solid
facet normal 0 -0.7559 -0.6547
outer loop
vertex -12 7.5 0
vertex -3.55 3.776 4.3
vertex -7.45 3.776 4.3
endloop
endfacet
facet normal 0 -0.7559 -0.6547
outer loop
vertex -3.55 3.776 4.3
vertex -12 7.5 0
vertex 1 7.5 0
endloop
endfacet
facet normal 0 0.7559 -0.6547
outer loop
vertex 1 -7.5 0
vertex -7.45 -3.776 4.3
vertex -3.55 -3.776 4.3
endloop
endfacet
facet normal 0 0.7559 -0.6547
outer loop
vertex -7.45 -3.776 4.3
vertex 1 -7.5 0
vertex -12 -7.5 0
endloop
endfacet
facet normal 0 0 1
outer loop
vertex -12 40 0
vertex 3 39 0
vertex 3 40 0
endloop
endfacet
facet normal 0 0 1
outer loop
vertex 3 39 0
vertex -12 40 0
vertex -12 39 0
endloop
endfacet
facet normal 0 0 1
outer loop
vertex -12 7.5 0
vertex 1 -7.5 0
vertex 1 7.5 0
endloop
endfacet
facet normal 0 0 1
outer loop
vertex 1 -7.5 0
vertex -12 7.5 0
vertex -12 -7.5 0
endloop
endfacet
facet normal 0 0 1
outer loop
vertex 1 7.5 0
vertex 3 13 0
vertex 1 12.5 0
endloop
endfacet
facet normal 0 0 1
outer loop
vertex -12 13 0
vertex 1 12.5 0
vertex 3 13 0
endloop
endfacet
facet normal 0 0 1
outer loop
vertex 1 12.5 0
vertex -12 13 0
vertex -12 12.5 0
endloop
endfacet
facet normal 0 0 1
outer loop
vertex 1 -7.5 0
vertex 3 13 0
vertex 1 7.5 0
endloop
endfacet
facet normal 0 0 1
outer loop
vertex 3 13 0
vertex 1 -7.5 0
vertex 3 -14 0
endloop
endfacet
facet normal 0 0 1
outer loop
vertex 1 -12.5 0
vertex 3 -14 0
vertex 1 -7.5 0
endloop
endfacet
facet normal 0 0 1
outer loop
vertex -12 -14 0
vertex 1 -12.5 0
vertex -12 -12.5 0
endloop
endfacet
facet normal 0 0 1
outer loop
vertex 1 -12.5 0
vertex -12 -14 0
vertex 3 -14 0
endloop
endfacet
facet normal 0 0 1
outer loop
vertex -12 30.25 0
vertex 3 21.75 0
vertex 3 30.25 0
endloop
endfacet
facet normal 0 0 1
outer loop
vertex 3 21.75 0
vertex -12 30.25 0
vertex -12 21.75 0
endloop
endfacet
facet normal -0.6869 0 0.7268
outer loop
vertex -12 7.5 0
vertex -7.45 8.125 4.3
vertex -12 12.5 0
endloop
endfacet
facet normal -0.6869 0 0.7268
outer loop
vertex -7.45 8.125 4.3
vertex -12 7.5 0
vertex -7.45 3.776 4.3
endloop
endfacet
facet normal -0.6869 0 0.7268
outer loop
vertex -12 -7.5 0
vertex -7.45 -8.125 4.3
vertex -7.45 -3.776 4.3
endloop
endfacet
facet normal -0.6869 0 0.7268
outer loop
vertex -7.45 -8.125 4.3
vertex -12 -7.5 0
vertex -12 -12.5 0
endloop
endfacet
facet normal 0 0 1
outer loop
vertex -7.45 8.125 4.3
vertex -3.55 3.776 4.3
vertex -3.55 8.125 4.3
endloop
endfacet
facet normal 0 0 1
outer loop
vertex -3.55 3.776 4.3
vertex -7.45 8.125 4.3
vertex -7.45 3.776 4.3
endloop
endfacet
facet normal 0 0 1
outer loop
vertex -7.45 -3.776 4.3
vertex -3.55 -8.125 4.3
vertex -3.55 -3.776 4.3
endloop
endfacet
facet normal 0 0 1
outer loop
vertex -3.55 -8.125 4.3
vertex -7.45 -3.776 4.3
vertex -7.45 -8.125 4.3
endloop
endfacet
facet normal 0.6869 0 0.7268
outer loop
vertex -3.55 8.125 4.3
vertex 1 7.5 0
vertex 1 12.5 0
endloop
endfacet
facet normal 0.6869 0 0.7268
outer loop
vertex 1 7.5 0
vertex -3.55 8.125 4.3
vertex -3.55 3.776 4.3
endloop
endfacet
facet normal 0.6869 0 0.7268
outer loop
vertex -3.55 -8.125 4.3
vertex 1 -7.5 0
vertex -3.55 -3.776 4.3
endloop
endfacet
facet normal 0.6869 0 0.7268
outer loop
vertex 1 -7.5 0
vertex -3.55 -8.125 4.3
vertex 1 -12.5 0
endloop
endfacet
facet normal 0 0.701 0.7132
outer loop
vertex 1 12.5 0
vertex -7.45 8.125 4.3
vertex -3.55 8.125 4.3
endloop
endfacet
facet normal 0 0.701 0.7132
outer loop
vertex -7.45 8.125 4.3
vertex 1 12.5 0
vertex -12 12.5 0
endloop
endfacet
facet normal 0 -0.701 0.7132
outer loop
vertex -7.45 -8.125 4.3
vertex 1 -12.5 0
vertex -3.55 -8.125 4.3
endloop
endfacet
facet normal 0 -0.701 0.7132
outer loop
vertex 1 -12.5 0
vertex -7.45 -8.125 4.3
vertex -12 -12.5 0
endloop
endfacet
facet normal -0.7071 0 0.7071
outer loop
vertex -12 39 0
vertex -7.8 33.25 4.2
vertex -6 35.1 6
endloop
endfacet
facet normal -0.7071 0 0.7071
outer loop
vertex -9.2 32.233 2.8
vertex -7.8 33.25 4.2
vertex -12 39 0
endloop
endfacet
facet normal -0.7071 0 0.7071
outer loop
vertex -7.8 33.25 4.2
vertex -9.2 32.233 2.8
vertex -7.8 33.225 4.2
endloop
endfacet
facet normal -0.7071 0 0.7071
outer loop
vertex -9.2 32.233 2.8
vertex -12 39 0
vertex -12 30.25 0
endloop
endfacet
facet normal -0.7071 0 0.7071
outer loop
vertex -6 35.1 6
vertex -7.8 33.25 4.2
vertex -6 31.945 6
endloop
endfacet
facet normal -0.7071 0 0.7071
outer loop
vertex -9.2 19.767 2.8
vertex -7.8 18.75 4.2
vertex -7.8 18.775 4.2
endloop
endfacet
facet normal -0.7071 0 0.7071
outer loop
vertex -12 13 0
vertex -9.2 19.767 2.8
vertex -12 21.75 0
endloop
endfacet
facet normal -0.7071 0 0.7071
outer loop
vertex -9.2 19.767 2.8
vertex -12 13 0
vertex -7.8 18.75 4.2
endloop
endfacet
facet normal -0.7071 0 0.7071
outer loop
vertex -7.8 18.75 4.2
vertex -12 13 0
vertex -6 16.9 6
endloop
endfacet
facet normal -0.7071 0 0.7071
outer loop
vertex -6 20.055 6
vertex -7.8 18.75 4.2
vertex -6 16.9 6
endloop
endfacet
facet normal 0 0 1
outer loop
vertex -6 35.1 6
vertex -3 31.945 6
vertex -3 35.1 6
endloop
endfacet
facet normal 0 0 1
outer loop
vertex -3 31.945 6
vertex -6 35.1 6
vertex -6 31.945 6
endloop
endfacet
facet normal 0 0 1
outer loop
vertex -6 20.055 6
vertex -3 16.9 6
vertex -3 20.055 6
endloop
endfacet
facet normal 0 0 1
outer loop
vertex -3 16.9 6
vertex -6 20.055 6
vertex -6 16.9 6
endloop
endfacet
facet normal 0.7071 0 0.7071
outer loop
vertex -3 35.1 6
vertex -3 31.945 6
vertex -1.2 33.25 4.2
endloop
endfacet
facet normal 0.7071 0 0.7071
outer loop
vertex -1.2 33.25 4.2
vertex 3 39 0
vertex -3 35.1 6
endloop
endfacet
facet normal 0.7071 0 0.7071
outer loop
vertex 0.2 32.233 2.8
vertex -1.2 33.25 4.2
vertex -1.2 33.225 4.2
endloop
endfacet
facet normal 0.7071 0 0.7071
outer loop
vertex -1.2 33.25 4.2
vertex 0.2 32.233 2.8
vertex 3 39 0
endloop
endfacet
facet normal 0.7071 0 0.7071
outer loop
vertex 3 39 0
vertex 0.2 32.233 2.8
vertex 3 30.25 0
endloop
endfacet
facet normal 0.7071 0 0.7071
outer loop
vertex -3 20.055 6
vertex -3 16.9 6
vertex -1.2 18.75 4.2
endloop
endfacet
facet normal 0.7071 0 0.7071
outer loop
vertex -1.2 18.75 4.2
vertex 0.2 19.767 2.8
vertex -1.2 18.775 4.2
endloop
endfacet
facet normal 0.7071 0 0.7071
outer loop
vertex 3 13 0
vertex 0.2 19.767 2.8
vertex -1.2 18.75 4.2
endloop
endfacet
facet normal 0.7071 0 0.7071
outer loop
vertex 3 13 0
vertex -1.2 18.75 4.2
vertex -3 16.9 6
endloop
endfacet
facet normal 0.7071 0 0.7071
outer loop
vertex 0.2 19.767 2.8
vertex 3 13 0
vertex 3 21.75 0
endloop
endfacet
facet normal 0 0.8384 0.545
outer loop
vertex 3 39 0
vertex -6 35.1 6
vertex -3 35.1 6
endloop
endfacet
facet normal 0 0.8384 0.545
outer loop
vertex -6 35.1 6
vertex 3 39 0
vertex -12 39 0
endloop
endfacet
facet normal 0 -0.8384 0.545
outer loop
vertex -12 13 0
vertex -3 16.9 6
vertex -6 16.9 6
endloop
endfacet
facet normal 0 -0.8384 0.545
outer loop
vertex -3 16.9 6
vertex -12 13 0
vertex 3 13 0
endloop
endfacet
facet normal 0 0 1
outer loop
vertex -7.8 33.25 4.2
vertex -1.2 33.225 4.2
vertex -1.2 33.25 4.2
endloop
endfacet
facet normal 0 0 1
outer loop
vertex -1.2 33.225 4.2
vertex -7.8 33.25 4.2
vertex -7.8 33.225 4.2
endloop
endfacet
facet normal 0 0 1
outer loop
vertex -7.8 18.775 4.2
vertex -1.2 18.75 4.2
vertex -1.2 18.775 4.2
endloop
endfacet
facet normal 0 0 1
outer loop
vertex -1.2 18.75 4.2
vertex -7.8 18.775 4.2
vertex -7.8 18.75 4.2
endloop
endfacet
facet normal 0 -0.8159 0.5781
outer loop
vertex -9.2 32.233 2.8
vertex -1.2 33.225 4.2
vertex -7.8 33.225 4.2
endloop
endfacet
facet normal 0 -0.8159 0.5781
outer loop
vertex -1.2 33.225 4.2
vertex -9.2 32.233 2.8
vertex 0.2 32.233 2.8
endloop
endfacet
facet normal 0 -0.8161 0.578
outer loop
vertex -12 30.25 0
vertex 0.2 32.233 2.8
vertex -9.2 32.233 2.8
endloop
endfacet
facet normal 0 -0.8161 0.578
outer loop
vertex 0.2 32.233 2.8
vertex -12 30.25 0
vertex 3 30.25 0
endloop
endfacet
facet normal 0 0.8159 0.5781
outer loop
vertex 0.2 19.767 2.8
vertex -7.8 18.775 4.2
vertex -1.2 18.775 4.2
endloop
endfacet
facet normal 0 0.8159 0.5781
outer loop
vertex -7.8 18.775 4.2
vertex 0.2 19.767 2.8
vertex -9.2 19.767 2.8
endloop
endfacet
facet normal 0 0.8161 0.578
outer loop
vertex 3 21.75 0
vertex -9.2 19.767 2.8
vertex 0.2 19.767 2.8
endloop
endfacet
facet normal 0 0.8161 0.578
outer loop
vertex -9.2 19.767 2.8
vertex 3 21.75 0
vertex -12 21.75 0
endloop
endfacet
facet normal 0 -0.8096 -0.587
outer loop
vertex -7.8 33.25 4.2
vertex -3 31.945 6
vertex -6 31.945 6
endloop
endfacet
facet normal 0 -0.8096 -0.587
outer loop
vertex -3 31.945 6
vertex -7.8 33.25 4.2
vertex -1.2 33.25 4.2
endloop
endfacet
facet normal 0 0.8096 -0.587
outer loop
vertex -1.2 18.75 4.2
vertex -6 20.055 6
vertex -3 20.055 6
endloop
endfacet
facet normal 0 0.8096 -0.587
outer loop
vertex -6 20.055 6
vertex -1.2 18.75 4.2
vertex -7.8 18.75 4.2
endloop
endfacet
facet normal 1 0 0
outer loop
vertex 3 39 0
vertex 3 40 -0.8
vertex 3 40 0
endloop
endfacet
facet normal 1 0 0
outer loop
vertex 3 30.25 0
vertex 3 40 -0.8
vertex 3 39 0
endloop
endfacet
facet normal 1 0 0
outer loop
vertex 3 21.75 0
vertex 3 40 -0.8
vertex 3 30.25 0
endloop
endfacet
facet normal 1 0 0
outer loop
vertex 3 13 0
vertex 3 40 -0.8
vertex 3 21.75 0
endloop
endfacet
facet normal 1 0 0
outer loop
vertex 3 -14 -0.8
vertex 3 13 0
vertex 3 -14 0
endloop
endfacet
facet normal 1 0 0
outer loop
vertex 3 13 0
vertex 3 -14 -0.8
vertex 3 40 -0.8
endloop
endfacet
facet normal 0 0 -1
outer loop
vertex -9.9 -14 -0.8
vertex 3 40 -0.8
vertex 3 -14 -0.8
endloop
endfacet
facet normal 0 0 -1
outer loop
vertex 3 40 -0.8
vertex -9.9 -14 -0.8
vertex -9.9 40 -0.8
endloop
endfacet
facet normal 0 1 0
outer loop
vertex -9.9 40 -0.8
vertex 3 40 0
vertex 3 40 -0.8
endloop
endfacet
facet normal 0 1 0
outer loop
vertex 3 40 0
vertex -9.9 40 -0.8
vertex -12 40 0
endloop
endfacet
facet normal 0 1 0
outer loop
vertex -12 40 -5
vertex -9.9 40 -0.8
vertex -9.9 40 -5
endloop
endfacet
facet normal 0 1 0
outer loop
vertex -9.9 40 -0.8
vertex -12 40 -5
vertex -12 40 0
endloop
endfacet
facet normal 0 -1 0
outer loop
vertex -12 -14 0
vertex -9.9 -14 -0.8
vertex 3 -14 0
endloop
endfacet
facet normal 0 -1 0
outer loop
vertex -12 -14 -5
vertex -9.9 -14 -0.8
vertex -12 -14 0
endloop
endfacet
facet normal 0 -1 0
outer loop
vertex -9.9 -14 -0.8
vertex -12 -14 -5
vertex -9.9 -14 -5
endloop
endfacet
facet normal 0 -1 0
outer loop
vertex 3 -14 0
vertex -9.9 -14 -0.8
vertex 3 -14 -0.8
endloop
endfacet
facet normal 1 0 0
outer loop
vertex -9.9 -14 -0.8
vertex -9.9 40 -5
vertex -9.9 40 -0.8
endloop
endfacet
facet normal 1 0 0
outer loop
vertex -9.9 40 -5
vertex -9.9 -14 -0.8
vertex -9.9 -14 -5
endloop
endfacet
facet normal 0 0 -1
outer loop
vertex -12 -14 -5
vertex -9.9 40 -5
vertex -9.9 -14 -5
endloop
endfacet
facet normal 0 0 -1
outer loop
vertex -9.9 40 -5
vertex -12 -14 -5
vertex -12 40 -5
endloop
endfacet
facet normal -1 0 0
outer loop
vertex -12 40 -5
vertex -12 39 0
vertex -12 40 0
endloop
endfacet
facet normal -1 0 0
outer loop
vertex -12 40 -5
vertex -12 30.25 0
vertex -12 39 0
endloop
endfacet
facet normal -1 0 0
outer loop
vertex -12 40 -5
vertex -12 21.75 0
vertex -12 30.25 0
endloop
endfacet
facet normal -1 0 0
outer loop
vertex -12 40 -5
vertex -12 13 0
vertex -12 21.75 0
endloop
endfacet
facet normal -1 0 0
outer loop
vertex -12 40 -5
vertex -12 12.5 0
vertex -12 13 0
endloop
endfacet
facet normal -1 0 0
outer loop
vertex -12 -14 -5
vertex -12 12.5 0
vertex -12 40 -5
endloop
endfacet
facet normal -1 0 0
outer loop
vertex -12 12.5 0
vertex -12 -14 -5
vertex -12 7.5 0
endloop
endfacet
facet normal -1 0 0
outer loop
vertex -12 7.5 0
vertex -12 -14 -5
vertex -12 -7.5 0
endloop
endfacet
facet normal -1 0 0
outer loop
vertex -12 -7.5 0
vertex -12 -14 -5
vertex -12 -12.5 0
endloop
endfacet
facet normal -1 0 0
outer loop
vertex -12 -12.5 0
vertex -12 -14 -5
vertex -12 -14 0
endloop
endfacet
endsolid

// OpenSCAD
//---------------------------------------------------------------------
// rtd.scad
//
// Mount PT1000 RTDs and support the wires
//
// DrTomFlint 10 Oct 2023
//---------------------------------------------------------------------

F1=99;

// ---------------------------------------------------------
module rtd(tol=0){

tab=10;
  
  difference(){

    // boss
    translate([-3,0,0])
    scale([1,1.5,1])
    rotate([0,90,0])
    rotate([0,0,30])
    cylinder(r=4.8+tol,h=12+tab+tol,center=true,$fn=6);
          
    // trim off bottom half
    translate([0,0,-5])
    cube([40,20,10],center=true);

    // trim for tabs
    translate([tab/2+1.5,0,3])
    cube([tab/2+2-tol,20-tol,4-tol],center=true);
    translate([-tab/2-7,0,3])
    cube([tab/2+2-tol,20-tol,4-tol],center=true);
    
    translate([-2,0,0]){
      // cuts for the rtd body
      translate([-0.6,0,0.25])
      cube([3,2.8,0.51+0.2],center=true);
      translate([0.55+0.8,0,0.55])
      cube([1.6+2,2.8,1.3],center=true);

      // rising cut for rtd leads
      translate([2.4,1.2,1])
      scale([1.5,1,1])
      cylinder(r=0.7,h=4,center=true,$fn=F1);
      translate([2.4,-1.2,1])
      scale([1.5,1,1])
      cylinder(r=0.7,h=4,center=true,$fn=F1);
    }
    
    // cuts for wiring
    translate([-3,1.2,2.7])
    rotate([0,90,0])
    cylinder(r1=0.85,r2=0.65,h=14,center=true,$fn=F1);

    hull(){
      translate([-3,-1.2,2.7])
      rotate([0,90,0])
      cylinder(r1=0.85,r2=0.65,h=14,center=true,$fn=F1);
      translate([-3,-2.6,2.7])
      rotate([0,90,0])
      cylinder(r1=0.85,r2=0.65,h=14,center=true,$fn=F1);
    }
    
    // cuts for solder junction
    translate([1.2,1.9,3.3])
    cube([4.5,2.8,2.8],center=true);
    translate([1.2,-1.9,3.3])
    cube([4.5,2.8,2.8],center=true);
  }


}

//----------------------------------------------------------------------
module rtdBlock1(){

thick=4.3;

  difference(){
    translate([-3,0,0])
    linear_extrude(height=thick,scale=[0.3,0.65])
    square([13,25],center=true);

    translate([0,0,1])
    cube([24,7,8],center=true);
    
    rtd(tol=0.2);
  }

}

//----------------------------------------------------------------------
module rtdBlock2(){

thick=6;

  difference(){
    translate([-3,0,0])
    linear_extrude(height=thick,scale=[0.2,0.7])
    square([15,26],center=true);
    
    //~ translate([0,0,1.2])
    //~ cube([24,15,6],center=true);
    translate([-3,0,0])
    linear_extrude(height=4.2,scale=[1,1.7])
    square([15,8.5],center=true);
    
    translate([-3,0,4.2])
    linear_extrude(height=thick,scale=[1,0.4])
    square([15,14.5],center=true);
  }

}

//----------------------------------------------------------------------
module rtdTest(){
  
//~ rtd();
translate([-2.5,0,0])
rtdBlock1();

//~ translate([0,26,4.2])
//~ rotate([180,0,0])
//~ rtd();

translate([-1.5,26,0])
rtdBlock2();

translate([-10,-14,-0.8])
cube([13,54,0.8]);

translate([-12,-14,-5])
cube([2.1,54,5]);

}  

//======================================================================

//~ rtd();
//~ rtdBlock1();

//~ translate([0,0,4.2])
//~ rotate([180,0,0])
//~ rtd();

//~ rtdBlock2();

rtdTest();

//======================================================================
